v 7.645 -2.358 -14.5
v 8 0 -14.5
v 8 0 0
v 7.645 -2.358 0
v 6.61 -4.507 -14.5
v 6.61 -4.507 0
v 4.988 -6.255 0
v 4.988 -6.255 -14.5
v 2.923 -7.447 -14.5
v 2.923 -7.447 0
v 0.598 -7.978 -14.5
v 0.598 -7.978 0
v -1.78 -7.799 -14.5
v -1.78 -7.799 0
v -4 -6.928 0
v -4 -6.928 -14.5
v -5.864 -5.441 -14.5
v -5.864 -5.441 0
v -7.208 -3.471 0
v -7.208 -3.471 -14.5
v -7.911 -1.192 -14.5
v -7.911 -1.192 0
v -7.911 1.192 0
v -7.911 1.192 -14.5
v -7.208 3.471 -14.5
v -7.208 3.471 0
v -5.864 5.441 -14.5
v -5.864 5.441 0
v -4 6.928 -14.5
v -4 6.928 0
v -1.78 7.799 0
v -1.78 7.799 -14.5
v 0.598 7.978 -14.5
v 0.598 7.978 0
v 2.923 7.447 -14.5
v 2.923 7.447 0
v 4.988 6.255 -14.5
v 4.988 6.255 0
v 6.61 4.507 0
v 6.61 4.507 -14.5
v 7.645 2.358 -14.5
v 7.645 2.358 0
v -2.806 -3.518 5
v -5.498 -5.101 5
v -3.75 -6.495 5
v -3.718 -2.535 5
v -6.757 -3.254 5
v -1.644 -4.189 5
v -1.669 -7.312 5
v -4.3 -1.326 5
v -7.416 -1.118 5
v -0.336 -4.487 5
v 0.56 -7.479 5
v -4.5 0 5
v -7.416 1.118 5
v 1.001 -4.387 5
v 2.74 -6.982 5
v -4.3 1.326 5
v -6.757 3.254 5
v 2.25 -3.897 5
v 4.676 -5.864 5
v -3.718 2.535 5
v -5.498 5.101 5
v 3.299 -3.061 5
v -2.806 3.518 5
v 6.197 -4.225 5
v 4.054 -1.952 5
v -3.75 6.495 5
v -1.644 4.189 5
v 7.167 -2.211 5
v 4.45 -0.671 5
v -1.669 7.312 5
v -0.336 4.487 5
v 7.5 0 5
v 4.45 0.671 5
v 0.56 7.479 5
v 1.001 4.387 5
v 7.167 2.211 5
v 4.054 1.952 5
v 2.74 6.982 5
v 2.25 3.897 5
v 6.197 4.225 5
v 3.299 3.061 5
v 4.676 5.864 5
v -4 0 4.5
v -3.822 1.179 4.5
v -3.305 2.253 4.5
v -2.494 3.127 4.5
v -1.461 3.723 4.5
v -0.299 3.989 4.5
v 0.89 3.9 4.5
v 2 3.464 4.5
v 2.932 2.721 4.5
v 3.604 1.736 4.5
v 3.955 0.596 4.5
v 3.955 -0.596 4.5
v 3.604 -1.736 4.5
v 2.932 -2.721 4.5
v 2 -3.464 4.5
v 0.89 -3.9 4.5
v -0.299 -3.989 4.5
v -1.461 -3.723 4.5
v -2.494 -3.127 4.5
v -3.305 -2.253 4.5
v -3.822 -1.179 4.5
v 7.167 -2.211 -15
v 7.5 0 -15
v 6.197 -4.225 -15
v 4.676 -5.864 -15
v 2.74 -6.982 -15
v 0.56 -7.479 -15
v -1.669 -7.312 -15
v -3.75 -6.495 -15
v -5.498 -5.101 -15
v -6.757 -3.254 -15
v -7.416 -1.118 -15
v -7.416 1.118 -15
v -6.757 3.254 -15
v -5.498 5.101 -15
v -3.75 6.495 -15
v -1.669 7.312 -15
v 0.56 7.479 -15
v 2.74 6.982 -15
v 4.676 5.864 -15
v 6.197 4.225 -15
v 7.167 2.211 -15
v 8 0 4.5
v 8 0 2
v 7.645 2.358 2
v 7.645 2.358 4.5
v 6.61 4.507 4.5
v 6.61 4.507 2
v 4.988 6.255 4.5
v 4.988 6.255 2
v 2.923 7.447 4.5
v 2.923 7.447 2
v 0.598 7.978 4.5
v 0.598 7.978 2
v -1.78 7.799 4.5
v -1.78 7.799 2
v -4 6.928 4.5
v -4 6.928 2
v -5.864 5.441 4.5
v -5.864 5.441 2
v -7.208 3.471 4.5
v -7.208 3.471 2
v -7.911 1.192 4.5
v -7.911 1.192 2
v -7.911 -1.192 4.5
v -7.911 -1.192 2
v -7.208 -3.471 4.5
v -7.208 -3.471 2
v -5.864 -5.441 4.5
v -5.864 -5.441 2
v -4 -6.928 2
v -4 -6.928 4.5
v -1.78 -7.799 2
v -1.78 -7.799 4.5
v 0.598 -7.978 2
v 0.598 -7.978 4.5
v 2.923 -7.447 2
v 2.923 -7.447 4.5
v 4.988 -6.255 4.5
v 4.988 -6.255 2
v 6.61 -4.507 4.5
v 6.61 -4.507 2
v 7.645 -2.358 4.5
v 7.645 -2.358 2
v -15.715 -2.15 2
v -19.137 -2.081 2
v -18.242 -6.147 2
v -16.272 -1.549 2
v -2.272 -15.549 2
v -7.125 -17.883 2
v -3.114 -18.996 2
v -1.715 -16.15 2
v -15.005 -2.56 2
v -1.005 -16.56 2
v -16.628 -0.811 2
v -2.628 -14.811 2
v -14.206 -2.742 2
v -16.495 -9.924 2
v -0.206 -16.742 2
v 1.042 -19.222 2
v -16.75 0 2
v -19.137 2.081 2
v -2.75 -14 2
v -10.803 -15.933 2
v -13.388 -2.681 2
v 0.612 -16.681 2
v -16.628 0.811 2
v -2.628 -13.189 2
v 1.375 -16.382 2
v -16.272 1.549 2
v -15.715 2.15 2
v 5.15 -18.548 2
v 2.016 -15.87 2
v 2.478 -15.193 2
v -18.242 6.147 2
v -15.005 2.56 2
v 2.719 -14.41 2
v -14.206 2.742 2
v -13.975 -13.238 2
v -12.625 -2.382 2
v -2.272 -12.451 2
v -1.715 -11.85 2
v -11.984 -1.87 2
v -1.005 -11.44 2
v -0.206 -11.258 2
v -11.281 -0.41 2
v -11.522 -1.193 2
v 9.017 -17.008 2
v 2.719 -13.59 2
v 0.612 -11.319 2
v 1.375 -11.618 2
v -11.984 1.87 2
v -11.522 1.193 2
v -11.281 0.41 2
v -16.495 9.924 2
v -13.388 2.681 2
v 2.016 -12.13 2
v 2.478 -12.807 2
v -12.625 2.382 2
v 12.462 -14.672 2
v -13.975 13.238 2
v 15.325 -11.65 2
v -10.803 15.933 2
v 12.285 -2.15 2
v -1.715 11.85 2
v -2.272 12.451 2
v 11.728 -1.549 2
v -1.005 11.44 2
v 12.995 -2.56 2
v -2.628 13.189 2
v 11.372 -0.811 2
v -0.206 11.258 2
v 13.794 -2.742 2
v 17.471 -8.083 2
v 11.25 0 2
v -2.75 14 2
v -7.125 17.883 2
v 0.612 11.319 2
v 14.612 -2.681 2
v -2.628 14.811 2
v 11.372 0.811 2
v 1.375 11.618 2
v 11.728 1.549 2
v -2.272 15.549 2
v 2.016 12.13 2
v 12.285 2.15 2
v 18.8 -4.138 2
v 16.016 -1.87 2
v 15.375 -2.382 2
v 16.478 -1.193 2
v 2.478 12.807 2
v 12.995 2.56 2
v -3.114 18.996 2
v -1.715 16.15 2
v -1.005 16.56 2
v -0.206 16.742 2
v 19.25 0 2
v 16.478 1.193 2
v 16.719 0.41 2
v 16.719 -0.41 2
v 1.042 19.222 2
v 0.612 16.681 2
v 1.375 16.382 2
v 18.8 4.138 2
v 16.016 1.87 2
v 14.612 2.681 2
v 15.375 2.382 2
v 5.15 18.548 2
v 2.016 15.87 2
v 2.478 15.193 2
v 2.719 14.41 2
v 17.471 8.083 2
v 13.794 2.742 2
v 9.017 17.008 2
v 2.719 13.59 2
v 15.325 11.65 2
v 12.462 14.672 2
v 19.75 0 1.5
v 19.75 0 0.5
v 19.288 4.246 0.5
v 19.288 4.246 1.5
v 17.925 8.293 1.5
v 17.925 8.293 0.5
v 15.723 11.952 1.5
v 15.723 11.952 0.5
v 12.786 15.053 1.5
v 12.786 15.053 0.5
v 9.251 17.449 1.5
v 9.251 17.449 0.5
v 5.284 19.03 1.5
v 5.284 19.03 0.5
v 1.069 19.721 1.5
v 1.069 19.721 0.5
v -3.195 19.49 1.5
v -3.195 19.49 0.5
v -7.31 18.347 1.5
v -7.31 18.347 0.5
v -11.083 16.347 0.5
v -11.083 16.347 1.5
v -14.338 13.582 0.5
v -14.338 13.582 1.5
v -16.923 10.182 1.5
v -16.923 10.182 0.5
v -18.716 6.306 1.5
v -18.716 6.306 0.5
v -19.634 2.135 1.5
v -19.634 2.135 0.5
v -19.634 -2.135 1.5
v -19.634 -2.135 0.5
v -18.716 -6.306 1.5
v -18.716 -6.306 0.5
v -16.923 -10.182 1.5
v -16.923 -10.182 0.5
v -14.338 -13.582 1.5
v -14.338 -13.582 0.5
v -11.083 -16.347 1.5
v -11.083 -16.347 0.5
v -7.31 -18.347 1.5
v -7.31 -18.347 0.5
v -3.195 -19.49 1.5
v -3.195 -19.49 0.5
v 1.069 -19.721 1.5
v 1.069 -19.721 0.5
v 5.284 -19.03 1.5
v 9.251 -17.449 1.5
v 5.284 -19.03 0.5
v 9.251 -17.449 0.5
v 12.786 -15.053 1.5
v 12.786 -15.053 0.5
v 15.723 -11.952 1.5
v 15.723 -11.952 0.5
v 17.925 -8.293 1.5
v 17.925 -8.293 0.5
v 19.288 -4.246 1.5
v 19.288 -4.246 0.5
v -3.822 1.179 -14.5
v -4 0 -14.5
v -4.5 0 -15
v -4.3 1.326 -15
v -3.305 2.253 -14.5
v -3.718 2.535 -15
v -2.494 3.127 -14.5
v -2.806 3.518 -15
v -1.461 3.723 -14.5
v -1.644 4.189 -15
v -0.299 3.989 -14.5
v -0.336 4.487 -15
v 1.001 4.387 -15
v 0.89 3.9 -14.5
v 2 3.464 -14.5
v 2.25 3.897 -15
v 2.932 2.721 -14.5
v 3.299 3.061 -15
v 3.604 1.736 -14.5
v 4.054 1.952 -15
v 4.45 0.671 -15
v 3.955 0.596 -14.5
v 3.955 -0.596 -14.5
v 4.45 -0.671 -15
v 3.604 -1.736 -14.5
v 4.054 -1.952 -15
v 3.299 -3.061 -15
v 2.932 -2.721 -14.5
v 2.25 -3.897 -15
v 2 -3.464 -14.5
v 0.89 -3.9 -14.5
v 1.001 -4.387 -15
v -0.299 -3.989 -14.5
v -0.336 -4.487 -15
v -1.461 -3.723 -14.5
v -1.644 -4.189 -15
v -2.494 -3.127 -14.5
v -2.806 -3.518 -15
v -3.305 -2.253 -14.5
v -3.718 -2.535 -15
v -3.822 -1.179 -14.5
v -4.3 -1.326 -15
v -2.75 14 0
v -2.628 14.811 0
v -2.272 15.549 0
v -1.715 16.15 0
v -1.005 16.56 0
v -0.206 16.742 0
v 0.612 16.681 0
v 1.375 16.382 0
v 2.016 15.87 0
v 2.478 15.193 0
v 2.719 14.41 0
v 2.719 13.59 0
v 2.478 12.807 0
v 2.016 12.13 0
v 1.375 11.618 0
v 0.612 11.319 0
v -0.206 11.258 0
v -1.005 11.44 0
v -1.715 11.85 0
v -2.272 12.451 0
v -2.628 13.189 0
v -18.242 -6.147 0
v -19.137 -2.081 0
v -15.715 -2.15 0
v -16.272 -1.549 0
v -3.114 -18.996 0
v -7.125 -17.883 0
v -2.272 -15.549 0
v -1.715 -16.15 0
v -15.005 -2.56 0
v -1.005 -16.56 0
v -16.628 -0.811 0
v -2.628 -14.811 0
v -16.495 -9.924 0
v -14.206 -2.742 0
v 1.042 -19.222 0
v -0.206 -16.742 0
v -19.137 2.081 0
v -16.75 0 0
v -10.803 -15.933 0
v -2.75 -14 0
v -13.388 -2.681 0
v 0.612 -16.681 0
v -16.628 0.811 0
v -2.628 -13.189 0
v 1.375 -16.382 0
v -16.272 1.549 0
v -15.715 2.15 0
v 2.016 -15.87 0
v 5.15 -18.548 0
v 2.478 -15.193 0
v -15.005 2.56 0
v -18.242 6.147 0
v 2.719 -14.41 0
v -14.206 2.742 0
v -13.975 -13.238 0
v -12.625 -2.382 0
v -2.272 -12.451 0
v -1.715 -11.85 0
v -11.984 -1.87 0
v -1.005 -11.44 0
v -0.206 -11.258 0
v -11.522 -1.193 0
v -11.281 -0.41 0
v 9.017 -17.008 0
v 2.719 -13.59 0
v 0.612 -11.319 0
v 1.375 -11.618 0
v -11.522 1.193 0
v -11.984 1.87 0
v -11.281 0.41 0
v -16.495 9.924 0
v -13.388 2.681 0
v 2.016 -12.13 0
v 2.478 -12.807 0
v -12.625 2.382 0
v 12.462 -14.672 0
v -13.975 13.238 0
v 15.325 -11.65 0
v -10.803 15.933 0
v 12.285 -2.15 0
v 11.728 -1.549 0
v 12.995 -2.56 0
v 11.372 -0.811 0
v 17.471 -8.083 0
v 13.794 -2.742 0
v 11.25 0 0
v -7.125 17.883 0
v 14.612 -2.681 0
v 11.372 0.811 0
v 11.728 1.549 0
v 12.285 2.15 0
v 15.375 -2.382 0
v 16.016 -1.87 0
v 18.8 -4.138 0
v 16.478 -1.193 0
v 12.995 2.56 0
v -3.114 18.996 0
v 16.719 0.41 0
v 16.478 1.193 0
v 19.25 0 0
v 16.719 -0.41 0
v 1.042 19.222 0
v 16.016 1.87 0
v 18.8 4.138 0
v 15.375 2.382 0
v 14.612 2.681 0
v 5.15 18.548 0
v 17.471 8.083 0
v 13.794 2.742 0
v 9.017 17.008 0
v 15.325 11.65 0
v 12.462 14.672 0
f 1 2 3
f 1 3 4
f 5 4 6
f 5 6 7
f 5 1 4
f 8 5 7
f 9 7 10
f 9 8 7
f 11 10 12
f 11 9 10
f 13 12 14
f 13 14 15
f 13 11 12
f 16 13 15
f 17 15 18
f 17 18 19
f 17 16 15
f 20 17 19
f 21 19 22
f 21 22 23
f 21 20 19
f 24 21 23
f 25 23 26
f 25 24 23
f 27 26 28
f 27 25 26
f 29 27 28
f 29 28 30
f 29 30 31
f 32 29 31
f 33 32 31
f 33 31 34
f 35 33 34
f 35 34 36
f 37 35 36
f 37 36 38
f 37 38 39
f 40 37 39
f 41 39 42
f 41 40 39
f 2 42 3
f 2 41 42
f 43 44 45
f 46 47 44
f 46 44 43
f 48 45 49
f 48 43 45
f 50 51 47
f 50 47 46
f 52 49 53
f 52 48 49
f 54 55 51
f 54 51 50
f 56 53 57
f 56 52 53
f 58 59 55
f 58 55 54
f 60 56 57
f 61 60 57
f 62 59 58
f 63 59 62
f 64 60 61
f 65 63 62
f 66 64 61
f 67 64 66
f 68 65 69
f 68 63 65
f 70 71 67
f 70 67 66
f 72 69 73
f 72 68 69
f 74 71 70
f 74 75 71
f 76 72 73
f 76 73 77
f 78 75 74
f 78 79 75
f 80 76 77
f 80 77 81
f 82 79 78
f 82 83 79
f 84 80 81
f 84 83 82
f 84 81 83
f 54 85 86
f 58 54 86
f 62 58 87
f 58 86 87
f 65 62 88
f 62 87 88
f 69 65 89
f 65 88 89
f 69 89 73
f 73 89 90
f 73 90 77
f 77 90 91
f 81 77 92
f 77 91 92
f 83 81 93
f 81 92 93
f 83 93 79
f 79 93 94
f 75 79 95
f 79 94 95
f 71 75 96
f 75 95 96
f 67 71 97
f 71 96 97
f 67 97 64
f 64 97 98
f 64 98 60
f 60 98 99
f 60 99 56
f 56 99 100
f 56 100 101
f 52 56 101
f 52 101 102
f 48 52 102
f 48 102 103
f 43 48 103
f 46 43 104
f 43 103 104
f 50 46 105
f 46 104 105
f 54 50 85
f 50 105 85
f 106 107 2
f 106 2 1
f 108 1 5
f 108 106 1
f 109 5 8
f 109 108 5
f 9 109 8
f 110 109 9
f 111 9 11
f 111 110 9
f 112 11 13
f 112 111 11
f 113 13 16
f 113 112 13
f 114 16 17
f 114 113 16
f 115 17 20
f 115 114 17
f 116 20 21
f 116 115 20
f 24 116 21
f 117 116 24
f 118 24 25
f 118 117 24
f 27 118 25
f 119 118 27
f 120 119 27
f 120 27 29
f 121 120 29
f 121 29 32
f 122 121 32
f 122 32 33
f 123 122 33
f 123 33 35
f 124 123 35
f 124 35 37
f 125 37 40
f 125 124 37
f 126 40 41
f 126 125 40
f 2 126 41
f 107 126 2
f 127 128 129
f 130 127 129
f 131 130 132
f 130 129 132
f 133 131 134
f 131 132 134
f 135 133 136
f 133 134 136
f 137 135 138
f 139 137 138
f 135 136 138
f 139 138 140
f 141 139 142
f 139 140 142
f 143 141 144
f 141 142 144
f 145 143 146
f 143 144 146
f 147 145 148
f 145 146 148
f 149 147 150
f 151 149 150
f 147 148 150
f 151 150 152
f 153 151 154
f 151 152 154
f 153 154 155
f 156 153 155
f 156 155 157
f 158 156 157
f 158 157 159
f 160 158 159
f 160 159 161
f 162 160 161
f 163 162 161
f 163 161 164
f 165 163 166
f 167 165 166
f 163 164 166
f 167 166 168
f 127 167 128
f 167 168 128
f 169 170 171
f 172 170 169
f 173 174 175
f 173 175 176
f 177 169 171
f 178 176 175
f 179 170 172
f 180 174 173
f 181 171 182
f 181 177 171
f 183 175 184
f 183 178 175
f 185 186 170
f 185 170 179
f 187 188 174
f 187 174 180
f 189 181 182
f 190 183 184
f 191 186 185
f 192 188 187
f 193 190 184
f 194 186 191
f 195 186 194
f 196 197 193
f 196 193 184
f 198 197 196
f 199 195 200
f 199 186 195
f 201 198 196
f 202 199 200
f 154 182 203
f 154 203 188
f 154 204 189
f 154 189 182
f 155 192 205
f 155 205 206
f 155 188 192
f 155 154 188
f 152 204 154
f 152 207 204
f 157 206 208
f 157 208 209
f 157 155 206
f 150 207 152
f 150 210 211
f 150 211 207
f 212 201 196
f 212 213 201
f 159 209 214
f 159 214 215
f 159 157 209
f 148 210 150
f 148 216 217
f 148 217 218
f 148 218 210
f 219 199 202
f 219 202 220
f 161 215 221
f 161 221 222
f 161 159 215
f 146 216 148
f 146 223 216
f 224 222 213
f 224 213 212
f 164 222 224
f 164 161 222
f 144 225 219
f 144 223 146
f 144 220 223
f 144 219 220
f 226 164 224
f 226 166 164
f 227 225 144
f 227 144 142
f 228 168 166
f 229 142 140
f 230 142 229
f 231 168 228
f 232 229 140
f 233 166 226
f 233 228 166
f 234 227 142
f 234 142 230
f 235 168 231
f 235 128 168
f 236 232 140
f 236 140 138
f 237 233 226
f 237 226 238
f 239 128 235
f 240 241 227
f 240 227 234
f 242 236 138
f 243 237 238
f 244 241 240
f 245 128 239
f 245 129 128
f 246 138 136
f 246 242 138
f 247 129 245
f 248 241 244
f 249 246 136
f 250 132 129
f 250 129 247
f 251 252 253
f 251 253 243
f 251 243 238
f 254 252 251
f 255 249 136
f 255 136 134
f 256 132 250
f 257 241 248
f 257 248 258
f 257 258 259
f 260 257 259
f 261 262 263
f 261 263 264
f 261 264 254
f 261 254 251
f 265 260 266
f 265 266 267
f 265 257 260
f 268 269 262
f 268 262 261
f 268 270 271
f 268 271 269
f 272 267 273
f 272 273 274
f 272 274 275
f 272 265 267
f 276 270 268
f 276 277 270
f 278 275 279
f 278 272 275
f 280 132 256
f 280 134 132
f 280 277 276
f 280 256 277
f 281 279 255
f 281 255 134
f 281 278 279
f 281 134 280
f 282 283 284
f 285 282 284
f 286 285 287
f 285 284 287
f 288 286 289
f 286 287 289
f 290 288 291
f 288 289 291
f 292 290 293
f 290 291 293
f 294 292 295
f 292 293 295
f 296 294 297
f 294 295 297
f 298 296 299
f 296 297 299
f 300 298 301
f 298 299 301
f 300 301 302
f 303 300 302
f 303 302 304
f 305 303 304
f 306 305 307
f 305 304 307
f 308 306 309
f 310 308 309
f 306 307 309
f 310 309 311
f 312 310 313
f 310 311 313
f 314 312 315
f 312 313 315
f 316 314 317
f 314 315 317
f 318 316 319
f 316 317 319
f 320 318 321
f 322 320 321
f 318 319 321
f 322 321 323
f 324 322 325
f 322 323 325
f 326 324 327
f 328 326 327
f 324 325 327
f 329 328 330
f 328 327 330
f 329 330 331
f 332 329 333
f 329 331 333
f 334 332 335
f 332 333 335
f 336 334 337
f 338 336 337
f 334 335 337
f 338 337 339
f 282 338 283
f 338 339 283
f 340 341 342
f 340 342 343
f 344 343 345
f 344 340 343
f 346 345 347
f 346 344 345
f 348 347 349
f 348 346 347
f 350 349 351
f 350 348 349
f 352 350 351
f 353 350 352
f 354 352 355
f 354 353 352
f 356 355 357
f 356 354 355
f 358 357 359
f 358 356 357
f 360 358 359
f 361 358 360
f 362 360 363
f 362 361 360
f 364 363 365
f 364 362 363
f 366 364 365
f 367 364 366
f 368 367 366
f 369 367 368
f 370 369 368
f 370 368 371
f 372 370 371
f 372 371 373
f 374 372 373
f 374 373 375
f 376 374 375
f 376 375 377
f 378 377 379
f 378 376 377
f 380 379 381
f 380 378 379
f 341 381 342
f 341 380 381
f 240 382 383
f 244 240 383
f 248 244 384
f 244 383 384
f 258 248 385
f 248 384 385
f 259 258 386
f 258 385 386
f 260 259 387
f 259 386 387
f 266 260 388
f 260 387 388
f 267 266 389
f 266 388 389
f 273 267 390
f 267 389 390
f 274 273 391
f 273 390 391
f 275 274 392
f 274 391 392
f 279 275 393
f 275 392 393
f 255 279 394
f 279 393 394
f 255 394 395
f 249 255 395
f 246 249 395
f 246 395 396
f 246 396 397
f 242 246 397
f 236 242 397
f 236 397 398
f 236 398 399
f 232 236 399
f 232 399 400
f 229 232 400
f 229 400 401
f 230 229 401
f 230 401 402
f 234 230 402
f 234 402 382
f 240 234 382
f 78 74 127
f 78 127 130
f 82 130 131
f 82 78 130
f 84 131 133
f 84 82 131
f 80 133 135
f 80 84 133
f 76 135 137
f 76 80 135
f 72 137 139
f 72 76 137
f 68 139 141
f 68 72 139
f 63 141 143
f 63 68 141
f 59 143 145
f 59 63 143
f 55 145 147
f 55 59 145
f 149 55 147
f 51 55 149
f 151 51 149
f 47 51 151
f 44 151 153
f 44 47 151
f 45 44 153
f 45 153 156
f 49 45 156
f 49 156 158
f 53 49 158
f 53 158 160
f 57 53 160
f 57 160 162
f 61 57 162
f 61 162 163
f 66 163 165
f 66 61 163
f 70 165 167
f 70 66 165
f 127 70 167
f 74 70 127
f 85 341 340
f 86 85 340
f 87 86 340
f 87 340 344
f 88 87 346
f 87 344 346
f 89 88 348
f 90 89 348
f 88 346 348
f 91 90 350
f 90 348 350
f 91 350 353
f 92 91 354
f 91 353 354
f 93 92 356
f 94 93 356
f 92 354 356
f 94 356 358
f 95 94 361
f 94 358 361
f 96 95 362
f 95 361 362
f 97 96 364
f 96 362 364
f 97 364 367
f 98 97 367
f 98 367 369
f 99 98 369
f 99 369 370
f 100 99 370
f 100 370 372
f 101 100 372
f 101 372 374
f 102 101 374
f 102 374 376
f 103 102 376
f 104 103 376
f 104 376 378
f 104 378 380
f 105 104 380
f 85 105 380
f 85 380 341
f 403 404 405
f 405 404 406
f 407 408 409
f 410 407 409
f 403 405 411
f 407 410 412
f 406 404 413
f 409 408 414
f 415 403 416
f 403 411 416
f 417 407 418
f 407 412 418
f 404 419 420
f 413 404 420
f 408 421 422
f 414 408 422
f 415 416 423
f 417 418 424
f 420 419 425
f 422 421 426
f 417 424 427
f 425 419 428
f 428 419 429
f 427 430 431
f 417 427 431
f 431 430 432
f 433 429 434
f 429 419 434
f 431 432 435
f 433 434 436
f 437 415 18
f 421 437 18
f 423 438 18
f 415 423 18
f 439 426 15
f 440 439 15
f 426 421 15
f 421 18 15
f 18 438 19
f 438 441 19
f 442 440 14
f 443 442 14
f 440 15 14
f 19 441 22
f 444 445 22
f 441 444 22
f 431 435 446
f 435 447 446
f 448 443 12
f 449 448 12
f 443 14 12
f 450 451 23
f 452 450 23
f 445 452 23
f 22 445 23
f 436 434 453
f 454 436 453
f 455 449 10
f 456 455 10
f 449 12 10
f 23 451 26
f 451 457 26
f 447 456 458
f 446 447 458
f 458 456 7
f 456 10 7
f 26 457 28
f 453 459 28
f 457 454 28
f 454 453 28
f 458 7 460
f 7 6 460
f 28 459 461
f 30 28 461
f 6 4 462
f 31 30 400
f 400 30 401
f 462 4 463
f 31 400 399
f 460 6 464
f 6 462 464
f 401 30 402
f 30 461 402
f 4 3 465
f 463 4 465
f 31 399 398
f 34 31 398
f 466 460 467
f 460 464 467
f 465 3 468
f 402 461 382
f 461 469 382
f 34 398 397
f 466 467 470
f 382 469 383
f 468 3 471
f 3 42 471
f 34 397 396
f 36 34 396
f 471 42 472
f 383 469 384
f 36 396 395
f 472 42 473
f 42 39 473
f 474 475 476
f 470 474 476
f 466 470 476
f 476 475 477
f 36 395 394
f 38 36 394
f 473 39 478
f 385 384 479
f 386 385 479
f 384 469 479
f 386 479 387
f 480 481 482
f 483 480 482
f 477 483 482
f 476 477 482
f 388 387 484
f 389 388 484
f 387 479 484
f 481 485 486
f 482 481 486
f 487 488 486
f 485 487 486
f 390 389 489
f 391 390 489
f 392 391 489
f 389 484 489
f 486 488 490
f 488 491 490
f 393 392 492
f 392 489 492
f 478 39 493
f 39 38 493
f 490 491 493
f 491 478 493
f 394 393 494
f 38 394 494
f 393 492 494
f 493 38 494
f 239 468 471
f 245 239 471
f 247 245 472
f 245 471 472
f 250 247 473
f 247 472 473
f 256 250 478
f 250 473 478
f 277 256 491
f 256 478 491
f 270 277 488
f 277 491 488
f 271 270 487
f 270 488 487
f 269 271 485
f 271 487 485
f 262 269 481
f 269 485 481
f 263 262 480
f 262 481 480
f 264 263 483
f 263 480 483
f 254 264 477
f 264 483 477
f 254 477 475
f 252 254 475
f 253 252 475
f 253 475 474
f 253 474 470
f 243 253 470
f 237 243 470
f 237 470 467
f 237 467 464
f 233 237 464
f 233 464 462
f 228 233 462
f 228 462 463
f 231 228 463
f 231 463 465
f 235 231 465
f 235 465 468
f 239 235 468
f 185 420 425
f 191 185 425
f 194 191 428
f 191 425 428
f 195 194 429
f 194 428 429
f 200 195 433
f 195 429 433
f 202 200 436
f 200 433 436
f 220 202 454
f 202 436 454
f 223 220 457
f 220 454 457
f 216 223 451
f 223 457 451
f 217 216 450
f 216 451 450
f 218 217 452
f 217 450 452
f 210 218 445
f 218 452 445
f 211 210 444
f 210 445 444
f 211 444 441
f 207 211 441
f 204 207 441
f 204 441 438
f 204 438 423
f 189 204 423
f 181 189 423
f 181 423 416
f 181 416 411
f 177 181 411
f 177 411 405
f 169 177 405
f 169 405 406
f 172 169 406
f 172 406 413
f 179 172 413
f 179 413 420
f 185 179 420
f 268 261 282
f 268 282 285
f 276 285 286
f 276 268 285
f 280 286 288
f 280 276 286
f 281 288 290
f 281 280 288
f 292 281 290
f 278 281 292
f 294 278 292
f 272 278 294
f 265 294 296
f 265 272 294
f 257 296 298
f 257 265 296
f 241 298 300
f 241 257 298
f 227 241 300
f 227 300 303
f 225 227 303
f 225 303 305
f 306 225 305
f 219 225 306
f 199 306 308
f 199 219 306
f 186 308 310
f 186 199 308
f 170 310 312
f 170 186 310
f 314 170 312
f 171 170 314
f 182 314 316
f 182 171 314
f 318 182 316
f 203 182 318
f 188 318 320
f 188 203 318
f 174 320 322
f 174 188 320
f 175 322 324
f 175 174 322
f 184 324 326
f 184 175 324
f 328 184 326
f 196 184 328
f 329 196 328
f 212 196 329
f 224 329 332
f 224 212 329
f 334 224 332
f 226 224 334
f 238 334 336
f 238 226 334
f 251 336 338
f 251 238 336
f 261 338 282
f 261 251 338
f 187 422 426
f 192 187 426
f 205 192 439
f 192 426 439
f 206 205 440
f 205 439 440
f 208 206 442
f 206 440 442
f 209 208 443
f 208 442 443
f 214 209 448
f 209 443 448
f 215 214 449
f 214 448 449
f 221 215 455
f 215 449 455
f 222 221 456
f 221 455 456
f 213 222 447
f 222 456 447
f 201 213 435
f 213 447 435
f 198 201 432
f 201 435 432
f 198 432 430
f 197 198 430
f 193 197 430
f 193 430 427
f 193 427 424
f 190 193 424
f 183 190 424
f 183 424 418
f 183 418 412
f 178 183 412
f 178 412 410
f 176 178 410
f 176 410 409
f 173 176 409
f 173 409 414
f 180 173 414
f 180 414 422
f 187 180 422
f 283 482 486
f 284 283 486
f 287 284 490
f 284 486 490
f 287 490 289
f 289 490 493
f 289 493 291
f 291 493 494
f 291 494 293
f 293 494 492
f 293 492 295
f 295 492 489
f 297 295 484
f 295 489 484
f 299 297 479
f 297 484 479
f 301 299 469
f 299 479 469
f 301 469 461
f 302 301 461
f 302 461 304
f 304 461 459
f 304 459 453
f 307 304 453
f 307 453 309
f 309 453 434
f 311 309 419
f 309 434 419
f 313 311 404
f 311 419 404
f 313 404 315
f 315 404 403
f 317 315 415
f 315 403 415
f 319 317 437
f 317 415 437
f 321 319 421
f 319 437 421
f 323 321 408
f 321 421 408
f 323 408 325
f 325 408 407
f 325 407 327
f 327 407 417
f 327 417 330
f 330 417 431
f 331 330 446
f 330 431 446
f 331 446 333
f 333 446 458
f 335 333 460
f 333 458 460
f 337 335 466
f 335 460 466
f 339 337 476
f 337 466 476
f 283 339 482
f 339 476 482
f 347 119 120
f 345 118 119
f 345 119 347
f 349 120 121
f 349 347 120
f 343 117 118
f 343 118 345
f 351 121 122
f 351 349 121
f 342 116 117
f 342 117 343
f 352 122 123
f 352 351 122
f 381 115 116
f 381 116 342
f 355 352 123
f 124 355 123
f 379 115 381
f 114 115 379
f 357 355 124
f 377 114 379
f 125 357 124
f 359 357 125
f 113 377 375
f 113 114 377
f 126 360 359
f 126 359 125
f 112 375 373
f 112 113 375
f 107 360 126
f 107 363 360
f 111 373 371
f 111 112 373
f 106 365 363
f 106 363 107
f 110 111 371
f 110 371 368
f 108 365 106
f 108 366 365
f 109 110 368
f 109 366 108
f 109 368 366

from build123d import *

# Parameters (mm, degrees)
SKETCH_1_R              = 19.75
EXTRUDE_1_DEPTH         = 2
SKETCH_2_R              = 8
EXTRUDE_2_DEPTH         = 3
EXTRUDE_START           = 15
SKETCH_3_R              = 8
EXTRUDE_3_DEPTH         = 15
HOLE_WIZARD_M8_1_D      = 8
HOLE_WIZARD_5_5_5_5_1_D = 5.5
CHAMFER_1_SIZE          = 0.5


with BuildPart() as part:
    # 草图1 → 凸台-拉伸1 (new body)
    with BuildSketch(Plane.XY):
        Circle(SKETCH_1_R)
    extrude(amount=EXTRUDE_1_DEPTH)

    # 草图2 → 凸台-拉伸2 (add)
    with BuildSketch(Plane.XY.offset(2)):
        Circle(SKETCH_2_R)
    extrude(amount=EXTRUDE_2_DEPTH)

    # 草图3 → 凸台-拉伸3 (add)
    with BuildSketch(Plane(origin=(0, 0, 0), x_dir=(-1, 0, 0), z_dir=(0, 0, -1)).offset(EXTRUDE_START)):
        with Locations(Location((0, 0, 0), (0, 0, 180))):
            Circle(SKETCH_3_R)
    extrude(amount=-EXTRUDE_3_DEPTH)

    # M8 螺纹孔1 (through all)
    with Locations(Plane.XY.offset(5)):
        with Locations((0, 0)):
            Hole(HOLE_WIZARD_M8_1_D / 2)

    # Ø5.5 (5.5) 直径孔1 (through all)
    with Locations(Plane.XY.offset(2)):
        with Locations((0, 14), (0, -14), (-14, 0), (14, 0)):
            Hole(HOLE_WIZARD_5_5_5_5_1_D / 2)

    # 倒角1
    chamfer_1_edges = [part.edges().sort_by_distance(p)[0] for p in [
        (-8, 0, -15),
        (4, 0, 5),
        (4, 0, -15),
        (-19.75, 0, 0),
        (-19.75, 0, 2),
        (-8, 0, 5),
    ]]
    chamfer(chamfer_1_edges, length=CHAMFER_1_SIZE)


solid = part.part
